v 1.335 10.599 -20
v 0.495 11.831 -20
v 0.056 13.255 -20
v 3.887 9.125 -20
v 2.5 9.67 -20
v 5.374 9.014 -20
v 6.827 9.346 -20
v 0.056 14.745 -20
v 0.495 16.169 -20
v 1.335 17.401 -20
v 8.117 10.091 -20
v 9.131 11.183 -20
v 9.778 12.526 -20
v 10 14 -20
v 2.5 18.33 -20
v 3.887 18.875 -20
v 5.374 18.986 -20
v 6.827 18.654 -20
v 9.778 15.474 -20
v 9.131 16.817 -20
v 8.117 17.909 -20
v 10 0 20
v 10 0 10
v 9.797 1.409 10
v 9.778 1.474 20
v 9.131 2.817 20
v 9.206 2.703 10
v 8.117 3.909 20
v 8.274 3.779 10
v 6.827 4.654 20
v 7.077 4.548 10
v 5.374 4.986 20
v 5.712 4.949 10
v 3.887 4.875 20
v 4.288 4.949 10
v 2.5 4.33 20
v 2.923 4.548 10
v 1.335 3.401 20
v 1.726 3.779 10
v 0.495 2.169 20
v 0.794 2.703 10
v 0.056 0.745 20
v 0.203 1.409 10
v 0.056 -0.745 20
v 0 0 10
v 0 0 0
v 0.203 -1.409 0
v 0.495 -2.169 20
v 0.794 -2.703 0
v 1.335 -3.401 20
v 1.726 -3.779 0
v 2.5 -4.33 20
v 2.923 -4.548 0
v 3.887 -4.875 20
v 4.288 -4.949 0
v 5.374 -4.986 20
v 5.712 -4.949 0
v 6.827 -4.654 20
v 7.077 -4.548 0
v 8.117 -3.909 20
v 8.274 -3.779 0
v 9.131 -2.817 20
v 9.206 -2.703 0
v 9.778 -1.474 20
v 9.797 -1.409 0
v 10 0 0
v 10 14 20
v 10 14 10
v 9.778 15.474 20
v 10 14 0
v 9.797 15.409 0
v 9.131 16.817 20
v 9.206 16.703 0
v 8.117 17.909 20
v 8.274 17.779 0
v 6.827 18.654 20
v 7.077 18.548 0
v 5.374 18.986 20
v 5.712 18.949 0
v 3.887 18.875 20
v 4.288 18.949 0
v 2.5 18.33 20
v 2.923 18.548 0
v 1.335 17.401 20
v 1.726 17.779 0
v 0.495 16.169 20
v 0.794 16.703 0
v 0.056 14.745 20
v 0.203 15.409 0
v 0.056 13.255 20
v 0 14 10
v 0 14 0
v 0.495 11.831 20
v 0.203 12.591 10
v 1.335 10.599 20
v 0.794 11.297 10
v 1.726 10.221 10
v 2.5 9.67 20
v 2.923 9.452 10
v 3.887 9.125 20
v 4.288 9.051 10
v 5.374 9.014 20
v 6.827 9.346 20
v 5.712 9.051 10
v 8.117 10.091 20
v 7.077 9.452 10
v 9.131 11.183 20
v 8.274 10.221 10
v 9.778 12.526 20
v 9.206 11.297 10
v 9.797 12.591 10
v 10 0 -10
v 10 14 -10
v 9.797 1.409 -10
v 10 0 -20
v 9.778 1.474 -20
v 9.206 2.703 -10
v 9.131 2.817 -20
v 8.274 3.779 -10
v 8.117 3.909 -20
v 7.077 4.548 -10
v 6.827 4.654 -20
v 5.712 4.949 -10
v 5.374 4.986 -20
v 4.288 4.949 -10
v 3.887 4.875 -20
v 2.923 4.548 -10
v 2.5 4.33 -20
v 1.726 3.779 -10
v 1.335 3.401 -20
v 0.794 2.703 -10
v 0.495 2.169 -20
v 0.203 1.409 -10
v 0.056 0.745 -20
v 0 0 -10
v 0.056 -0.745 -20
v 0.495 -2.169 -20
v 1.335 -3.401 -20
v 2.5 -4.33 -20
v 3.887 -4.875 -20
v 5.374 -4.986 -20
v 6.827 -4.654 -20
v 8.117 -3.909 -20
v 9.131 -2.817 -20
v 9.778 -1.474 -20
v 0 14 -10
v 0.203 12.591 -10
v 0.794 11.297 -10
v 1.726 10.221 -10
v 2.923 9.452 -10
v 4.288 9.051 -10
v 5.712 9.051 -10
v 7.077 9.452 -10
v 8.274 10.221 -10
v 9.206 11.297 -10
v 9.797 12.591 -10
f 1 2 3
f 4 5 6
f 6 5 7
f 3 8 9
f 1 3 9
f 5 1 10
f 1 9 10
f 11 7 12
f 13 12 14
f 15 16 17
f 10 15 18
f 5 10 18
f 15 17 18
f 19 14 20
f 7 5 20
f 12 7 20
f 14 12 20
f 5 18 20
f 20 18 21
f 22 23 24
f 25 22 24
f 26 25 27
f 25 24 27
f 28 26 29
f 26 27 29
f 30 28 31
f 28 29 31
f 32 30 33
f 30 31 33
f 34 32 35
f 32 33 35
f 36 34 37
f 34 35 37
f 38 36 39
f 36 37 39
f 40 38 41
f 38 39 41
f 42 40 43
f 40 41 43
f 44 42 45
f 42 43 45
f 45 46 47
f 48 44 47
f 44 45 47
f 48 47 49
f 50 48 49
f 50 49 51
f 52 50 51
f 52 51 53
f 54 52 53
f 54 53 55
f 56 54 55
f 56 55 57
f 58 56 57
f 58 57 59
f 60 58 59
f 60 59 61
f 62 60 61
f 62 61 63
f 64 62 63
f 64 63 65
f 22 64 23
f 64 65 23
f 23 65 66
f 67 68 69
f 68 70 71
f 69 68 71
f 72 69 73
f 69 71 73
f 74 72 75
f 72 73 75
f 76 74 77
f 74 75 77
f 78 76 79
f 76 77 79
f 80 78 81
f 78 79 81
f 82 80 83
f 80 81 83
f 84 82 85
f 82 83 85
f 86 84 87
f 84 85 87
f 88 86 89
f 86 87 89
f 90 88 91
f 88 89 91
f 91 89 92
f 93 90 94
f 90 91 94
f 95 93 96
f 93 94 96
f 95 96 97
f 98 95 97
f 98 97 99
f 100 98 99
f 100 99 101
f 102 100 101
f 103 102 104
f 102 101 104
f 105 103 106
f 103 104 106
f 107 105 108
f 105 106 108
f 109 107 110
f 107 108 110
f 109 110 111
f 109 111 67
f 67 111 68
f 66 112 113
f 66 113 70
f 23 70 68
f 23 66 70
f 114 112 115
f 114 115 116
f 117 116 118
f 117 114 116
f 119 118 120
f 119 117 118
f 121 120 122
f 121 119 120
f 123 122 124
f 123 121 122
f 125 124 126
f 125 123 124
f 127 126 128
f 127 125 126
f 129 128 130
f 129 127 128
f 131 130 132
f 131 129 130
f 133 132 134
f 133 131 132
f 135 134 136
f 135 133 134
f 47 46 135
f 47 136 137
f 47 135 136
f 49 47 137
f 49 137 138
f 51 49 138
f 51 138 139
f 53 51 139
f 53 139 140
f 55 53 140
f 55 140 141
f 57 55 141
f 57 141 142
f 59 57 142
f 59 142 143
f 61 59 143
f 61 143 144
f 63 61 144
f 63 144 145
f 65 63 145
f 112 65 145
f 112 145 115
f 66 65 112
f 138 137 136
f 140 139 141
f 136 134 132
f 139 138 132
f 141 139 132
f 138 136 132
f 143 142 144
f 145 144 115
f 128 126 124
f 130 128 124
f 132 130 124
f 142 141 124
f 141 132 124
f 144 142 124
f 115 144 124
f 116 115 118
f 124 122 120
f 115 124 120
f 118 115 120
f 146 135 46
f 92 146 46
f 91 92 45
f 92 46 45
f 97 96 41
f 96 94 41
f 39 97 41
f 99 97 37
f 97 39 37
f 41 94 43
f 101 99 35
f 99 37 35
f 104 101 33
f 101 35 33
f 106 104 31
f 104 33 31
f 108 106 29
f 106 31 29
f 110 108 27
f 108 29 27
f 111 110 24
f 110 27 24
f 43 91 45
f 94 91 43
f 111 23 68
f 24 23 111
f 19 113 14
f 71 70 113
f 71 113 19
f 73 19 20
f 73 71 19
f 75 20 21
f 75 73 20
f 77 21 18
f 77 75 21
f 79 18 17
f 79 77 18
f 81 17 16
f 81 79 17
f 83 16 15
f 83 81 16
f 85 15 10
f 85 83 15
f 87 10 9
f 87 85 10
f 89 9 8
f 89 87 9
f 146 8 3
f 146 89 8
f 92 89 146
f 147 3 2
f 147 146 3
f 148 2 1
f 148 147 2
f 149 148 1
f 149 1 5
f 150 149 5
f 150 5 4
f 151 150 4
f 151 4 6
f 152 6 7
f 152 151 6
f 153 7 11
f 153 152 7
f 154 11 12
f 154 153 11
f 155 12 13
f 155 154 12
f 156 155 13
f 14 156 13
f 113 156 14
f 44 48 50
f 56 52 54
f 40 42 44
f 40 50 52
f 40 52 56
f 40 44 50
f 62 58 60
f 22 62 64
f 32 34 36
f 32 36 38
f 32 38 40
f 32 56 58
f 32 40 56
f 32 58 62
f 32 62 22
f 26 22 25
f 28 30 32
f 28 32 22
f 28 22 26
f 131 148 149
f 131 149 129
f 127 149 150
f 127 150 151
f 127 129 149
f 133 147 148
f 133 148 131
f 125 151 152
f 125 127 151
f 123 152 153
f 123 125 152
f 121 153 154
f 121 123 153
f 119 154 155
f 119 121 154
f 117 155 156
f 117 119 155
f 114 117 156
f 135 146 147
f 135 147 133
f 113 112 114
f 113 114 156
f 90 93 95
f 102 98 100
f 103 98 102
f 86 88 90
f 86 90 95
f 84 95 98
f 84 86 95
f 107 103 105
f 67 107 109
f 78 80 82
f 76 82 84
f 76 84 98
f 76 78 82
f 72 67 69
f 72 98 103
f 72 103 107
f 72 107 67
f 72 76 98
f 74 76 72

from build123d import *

# Parameters (mm, degrees)
SKETCH1_W           = 10
SKETCH1_H           = 10
BOSS_EXTRUDE1_DEPTH = 14
SKETCH2_R           = 5
BOSS_EXTRUDE2_DEPTH = 20


with BuildPart() as part:
    # Sketch1 → Boss-Extrude1 (new body)
    with BuildSketch(Plane(origin=(0, 0, 0), x_dir=(1, 0, 0), z_dir=(0, 1, 0))):
        with Locations((5, -5)):
            Rectangle(SKETCH1_W, SKETCH1_H)
    boss_extrude1 = extrude(amount=BOSS_EXTRUDE1_DEPTH)

    # Sketch2 → Boss-Extrude2 (add)
    with BuildSketch(Plane.XY):
        with Locations((5, 14)):
            Circle(SKETCH2_R)
        with Locations((5, 0)):
            Circle(SKETCH2_R)
    boss_extrude2 = extrude(amount=BOSS_EXTRUDE2_DEPTH)

    # Mirror1: Boss-Extrude1, Boss-Extrude2 across plane
    add(boss_extrude1.mirror(Plane(origin=(0, 14, 0), x_dir=(1, 0, 0), z_dir=(0, 0, 1))))
    add(boss_extrude2.mirror(Plane(origin=(0, 14, 0), x_dir=(1, 0, 0), z_dir=(0, 0, 1))))


solid = part.part
